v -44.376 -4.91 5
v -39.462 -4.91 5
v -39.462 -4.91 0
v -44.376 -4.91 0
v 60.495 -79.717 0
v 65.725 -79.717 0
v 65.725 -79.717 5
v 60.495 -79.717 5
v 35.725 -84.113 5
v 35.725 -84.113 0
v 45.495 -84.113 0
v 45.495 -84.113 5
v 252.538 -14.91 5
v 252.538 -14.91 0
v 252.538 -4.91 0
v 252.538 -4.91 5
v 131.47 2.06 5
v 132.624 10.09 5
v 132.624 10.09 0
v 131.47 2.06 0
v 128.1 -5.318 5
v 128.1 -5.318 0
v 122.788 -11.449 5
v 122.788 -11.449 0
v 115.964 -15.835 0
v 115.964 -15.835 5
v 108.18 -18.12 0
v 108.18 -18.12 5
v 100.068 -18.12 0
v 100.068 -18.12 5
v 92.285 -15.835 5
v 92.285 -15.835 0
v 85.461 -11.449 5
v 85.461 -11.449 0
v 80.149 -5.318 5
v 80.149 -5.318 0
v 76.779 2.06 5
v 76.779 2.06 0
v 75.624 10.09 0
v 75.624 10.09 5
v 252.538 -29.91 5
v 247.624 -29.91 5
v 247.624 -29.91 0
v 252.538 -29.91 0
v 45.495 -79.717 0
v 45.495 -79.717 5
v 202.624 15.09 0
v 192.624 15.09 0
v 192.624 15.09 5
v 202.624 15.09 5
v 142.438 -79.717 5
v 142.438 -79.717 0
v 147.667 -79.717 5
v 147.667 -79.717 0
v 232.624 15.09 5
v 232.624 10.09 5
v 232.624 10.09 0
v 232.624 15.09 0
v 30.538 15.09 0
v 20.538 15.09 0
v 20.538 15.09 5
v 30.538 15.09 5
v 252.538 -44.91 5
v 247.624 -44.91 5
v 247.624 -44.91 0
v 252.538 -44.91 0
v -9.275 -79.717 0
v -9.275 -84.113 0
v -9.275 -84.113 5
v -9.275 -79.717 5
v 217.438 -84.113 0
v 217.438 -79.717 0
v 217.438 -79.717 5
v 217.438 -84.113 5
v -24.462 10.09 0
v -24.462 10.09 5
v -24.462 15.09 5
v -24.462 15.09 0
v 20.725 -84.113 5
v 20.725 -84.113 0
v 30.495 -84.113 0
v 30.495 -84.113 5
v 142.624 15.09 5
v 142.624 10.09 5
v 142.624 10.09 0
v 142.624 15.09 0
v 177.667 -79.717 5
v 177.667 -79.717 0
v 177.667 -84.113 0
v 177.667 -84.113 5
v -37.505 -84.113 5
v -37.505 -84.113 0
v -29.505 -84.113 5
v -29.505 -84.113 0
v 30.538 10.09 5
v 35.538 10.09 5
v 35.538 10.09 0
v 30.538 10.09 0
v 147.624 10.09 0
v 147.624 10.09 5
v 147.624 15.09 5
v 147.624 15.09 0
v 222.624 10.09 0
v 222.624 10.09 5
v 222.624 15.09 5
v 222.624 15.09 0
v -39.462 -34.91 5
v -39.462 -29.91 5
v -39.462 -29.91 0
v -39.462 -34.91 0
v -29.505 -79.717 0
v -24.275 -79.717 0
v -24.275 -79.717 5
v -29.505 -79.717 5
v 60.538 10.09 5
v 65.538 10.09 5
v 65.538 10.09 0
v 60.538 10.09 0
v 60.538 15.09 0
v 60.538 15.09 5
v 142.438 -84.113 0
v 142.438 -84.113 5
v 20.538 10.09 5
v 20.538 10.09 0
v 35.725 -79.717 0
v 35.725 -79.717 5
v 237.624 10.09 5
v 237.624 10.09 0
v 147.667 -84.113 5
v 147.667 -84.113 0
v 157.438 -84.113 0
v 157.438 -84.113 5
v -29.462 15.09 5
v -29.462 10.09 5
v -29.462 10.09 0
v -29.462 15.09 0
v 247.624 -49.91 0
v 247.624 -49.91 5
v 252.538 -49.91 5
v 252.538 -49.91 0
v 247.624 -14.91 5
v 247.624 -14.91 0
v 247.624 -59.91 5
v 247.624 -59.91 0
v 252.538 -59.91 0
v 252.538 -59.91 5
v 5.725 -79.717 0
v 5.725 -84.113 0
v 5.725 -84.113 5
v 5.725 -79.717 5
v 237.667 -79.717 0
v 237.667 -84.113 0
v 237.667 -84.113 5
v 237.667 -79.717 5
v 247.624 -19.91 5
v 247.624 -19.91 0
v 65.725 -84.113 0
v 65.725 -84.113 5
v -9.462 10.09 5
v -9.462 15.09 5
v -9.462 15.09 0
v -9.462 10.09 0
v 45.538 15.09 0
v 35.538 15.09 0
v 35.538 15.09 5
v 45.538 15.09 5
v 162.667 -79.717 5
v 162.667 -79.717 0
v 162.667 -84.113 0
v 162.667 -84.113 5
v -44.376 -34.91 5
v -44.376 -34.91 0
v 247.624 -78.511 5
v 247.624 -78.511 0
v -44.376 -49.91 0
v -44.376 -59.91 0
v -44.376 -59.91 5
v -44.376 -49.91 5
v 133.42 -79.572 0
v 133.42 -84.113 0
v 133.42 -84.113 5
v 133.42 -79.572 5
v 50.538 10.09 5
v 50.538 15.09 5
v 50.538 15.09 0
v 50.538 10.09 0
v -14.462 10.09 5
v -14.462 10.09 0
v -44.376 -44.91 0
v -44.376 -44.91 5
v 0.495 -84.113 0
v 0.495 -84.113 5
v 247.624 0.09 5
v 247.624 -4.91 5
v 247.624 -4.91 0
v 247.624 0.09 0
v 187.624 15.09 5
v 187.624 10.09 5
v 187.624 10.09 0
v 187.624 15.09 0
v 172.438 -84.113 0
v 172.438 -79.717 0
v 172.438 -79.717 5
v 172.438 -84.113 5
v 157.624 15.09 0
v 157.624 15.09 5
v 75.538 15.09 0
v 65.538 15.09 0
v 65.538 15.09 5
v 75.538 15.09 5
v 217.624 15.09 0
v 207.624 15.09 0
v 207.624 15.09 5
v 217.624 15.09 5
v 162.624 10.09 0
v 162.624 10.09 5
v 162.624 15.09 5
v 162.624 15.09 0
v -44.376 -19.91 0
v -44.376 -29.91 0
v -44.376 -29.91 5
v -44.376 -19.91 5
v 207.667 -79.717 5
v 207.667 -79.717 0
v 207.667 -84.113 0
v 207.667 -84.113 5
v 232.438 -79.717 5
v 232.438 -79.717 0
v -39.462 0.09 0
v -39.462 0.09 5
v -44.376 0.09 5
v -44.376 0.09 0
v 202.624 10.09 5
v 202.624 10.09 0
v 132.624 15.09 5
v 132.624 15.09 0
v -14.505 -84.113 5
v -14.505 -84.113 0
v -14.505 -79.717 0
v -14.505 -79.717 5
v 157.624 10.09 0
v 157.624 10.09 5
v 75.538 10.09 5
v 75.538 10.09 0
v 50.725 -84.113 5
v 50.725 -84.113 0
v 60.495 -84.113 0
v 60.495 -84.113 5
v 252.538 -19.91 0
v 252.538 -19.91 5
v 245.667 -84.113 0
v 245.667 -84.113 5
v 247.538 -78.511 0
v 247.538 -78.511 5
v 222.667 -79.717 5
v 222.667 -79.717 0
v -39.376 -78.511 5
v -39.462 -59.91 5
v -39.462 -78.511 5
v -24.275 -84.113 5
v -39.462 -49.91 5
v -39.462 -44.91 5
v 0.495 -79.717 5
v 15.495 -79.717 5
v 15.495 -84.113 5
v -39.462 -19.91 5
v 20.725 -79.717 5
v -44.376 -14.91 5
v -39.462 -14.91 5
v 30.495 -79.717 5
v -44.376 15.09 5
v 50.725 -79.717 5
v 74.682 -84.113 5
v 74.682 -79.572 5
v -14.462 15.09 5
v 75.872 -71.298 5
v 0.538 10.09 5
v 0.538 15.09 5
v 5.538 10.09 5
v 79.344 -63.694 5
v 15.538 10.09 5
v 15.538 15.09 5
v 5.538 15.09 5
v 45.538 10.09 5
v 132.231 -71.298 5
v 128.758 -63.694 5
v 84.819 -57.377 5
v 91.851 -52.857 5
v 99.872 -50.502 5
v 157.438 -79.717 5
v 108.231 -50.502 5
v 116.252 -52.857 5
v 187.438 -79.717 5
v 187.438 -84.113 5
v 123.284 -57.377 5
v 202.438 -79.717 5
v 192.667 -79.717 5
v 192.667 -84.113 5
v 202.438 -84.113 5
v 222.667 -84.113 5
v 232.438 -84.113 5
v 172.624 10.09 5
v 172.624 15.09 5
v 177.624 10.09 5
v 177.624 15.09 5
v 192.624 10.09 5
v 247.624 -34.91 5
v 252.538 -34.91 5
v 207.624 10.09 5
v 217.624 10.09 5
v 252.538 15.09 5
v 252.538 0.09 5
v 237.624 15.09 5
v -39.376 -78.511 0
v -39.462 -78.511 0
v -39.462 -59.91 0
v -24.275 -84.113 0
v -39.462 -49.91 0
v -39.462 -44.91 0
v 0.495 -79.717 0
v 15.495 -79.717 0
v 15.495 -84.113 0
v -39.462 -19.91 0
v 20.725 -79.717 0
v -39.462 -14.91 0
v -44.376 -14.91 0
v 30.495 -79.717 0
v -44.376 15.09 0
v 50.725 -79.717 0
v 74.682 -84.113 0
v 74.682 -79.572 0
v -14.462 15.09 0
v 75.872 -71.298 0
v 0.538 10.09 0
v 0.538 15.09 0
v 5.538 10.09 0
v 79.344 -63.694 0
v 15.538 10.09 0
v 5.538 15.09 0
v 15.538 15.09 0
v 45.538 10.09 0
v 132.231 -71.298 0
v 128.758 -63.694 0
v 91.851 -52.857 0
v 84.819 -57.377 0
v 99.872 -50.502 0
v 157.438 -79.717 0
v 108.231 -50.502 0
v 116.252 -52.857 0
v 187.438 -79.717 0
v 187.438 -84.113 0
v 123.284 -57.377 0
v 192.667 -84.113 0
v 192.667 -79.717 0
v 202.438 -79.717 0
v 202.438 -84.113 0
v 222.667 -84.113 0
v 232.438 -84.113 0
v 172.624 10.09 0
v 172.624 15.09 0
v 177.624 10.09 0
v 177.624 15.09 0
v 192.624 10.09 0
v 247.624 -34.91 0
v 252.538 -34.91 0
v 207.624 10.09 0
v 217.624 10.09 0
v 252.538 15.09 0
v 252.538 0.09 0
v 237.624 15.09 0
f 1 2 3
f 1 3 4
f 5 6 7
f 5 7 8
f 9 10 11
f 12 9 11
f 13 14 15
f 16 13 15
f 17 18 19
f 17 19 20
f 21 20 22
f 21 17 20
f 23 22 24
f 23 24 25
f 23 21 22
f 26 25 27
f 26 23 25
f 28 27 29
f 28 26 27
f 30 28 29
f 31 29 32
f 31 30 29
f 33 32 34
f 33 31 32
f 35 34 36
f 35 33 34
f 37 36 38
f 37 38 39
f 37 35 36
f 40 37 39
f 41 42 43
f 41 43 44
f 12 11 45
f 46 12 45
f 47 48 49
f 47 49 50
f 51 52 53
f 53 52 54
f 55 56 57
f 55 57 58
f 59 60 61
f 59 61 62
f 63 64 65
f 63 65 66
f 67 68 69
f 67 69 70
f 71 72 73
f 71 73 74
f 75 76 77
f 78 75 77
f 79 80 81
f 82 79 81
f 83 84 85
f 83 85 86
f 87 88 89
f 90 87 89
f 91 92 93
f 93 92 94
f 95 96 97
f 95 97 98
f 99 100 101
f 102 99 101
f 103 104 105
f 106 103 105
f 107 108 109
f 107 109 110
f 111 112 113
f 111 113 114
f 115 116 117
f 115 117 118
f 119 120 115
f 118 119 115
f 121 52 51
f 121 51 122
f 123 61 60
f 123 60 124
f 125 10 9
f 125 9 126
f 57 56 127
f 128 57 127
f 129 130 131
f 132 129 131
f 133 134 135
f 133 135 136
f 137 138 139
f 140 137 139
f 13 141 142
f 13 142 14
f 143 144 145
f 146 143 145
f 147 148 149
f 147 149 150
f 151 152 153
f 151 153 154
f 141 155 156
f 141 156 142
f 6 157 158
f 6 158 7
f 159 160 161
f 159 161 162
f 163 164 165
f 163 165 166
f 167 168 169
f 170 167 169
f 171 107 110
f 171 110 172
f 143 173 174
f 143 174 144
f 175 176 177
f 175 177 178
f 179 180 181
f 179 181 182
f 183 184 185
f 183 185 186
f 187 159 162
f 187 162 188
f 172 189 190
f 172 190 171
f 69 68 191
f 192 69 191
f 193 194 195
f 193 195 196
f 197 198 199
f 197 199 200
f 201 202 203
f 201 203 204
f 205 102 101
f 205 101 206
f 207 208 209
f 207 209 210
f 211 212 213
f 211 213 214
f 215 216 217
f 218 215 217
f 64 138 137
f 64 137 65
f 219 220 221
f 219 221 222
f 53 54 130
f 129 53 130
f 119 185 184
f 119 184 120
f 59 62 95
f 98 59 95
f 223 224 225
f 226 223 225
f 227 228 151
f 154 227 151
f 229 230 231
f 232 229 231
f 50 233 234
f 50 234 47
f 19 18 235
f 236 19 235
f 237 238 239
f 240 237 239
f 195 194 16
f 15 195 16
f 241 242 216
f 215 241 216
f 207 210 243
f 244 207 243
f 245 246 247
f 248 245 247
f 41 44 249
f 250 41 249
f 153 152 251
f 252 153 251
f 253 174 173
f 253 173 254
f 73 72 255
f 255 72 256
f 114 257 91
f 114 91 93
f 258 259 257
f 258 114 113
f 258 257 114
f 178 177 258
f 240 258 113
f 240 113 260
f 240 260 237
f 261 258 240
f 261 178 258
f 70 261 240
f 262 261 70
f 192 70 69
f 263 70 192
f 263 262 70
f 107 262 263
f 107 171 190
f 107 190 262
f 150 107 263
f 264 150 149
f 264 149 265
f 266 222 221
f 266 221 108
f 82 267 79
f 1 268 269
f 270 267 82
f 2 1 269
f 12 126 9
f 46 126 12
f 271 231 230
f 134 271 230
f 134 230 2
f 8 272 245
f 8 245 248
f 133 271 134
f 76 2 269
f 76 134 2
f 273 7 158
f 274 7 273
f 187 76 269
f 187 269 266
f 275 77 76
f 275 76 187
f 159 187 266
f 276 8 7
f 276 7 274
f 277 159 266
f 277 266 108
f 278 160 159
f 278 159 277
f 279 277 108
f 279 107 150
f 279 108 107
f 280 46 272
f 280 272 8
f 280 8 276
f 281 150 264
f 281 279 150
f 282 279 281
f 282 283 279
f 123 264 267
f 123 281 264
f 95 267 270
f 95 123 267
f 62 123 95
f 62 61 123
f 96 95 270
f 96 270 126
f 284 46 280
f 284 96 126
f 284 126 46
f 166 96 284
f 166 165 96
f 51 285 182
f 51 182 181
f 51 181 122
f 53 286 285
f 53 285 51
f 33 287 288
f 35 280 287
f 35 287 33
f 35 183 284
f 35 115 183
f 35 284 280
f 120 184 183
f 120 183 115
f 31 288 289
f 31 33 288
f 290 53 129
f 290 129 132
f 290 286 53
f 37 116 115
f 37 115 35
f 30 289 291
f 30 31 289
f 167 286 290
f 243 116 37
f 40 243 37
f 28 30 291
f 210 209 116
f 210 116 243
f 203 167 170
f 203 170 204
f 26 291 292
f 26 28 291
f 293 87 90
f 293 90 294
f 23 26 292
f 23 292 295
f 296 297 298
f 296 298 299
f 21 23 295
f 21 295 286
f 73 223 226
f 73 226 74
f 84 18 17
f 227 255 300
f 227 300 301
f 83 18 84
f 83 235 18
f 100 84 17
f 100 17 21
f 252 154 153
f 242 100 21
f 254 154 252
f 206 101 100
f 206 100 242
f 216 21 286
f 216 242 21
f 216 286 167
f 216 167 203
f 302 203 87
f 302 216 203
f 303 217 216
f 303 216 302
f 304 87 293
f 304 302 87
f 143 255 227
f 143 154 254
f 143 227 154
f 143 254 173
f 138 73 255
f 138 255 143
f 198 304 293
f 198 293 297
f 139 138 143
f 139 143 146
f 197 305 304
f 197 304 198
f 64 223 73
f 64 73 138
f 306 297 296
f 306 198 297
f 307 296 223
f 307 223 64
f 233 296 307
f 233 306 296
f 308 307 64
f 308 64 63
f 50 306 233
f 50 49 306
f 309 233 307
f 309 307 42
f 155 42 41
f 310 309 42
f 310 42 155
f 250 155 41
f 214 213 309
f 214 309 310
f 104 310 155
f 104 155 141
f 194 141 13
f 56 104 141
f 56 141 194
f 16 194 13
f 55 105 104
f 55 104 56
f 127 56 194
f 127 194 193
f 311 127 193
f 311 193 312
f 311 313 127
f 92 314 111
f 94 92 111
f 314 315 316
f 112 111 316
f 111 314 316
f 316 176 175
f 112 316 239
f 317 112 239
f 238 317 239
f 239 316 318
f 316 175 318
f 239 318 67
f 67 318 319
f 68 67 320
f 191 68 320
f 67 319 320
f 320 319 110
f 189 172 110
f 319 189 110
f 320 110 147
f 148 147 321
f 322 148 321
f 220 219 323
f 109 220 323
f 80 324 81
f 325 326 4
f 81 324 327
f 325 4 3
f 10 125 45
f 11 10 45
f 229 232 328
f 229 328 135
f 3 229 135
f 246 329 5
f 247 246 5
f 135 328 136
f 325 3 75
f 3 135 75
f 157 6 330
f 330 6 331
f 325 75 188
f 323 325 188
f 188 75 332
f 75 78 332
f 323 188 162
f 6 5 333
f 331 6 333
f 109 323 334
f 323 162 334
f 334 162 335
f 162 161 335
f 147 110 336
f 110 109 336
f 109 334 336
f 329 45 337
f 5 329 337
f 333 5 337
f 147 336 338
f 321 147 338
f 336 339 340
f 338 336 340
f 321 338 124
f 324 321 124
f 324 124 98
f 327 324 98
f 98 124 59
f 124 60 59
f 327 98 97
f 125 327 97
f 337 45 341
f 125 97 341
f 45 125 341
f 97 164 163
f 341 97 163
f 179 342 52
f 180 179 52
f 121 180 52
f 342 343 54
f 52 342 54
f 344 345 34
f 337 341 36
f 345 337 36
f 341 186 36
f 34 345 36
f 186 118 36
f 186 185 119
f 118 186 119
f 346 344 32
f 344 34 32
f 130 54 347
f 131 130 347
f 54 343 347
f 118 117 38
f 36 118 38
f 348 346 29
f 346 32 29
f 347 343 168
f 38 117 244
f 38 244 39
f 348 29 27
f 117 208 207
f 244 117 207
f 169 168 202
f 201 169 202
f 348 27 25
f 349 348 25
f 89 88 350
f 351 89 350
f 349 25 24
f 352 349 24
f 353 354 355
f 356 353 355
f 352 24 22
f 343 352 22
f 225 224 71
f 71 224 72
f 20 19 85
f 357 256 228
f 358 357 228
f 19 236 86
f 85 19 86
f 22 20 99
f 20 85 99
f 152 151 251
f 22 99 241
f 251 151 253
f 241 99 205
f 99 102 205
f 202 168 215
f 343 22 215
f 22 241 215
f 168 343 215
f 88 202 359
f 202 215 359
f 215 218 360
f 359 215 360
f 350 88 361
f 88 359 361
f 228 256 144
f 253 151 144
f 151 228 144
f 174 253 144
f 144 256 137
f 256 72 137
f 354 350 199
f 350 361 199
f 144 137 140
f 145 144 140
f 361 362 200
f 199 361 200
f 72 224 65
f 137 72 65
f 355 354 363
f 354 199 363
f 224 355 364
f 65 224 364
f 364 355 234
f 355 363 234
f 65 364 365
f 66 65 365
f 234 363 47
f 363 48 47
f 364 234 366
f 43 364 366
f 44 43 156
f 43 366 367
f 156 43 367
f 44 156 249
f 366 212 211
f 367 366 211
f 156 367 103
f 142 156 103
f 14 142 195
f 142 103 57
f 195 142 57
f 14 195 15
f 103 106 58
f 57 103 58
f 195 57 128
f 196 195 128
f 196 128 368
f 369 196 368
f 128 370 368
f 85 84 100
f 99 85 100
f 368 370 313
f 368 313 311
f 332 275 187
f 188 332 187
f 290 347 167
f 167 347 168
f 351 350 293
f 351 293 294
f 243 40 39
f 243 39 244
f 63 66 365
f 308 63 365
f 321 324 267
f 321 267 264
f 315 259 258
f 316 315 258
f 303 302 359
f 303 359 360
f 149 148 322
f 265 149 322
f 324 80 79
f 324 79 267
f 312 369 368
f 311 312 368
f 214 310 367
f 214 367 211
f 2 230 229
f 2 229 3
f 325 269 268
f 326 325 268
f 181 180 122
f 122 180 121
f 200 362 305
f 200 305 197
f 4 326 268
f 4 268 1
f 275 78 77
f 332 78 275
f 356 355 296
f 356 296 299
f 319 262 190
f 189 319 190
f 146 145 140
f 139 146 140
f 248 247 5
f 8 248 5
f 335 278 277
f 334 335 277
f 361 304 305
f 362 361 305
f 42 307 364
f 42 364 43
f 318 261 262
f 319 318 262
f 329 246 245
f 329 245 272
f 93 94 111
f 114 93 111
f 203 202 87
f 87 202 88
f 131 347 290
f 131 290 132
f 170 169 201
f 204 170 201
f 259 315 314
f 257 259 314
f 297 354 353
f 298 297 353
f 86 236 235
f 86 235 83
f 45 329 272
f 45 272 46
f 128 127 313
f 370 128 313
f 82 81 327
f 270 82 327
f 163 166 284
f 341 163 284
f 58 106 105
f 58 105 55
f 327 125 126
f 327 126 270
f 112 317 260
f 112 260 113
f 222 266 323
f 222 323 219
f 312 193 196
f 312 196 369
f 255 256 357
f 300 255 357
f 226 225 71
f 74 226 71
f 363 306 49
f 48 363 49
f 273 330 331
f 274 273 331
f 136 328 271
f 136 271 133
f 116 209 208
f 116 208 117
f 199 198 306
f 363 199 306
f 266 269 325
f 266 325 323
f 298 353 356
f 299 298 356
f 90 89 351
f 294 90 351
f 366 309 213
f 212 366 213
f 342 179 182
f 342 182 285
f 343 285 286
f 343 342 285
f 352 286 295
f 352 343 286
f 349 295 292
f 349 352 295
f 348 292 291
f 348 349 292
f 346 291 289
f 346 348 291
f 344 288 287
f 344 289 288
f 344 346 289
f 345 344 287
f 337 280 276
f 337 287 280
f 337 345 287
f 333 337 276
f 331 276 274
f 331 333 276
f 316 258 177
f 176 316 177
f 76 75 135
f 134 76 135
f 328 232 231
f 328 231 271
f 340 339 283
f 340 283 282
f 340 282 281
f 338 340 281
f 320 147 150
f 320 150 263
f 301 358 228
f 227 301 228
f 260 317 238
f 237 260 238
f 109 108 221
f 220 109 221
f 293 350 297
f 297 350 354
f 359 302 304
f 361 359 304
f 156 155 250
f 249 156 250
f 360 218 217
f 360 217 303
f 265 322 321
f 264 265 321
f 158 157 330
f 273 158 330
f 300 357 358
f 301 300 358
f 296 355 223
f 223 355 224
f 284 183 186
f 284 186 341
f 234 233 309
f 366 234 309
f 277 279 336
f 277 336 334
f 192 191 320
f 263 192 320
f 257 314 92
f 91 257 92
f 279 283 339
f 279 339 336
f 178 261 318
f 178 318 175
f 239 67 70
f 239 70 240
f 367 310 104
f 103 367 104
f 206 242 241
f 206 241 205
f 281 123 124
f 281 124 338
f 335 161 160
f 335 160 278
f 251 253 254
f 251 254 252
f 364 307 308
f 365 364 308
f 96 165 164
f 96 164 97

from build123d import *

# Parameters (mm, degrees)
ESQUISSE1_W                = 296.913296363
ESQUISSE1_H                = 99.202689883
BOSS_EXTRU_1_DEPTH         = 5
ENL_V_MAT_EXTRU_1_DEPTH    = 10
ESQUISSE3_W                = 5.229303798
ESQUISSE3_H                = 4.396229451
ENL_V_MAT_EXTRU_2_DEPTH    = 10
R_P_TITION_LIN_AIRE1_COUNT = 7
R_P_TITION_LIN_AIRE1_PITCH = 15
SYM_TRIE1_COPY_1_SKETCH_W  = 5.229303798
SYM_TRIE1_COPY_1_SKETCH_H  = 4.396229451
SYM_TRIE1_COPY_1_DEPTH     = 10
SYM_TRIE1_COPY_2_SKETCH_W  = 5.229303798
SYM_TRIE1_COPY_2_SKETCH_H  = 4.396229451
SYM_TRIE1_COPY_2_DEPTH     = 10
SYM_TRIE1_COPY_3_SKETCH_W  = 5.229303798
SYM_TRIE1_COPY_3_SKETCH_H  = 4.396229451
SYM_TRIE1_COPY_3_DEPTH     = 10
SYM_TRIE1_COPY_4_SKETCH_W  = 5.229303798
SYM_TRIE1_COPY_4_SKETCH_H  = 4.396229451
SYM_TRIE1_COPY_4_DEPTH     = 10
SYM_TRIE1_COPY_5_SKETCH_W  = 5.229303798
SYM_TRIE1_COPY_5_SKETCH_H  = 4.396229451
SYM_TRIE1_COPY_5_DEPTH     = 10
SYM_TRIE1_COPY_6_SKETCH_W  = 5.229303798
SYM_TRIE1_COPY_6_SKETCH_H  = 4.396229451
SYM_TRIE1_COPY_6_DEPTH     = 10
ESQUISSE4_W                = 58.738288448
ESQUISSE4_H                = 4.540442772
ENL_V_MAT_EXTRU_3_DEPTH    = 10
ENL_V_MAT_EXTRU_4_DEPTH    = 10
ESQUISSE6_W                = 5
ESQUISSE6_H                = 5
ENL_V_MAT_EXTRU_5_DEPTH    = 5
R_P_TITION_LIN_AIRE2_COUNT = 8
R_P_TITION_LIN_AIRE2_PITCH = 15
ESQUISSE7_W                = 57
ESQUISSE7_H                = 5
ENL_V_MAT_EXTRU_6_DEPTH    = 5
ENL_V_MAT_EXTRU_7_DEPTH    = 5
SYM_TRIE2_COPY_1_SKETCH_W  = 5
SYM_TRIE2_COPY_1_SKETCH_H  = 5
SYM_TRIE2_COPY_1_DEPTH     = 5
SYM_TRIE2_COPY_2_SKETCH_W  = 5
SYM_TRIE2_COPY_2_SKETCH_H  = 5
SYM_TRIE2_COPY_2_DEPTH     = 5
SYM_TRIE2_COPY_3_SKETCH_W  = 5
SYM_TRIE2_COPY_3_SKETCH_H  = 5
SYM_TRIE2_COPY_3_DEPTH     = 5
SYM_TRIE2_COPY_4_SKETCH_W  = 5
SYM_TRIE2_COPY_4_SKETCH_H  = 5
SYM_TRIE2_COPY_4_DEPTH     = 5
SYM_TRIE2_COPY_5_SKETCH_W  = 5
SYM_TRIE2_COPY_5_SKETCH_H  = 5
SYM_TRIE2_COPY_5_DEPTH     = 5
SYM_TRIE2_COPY_6_SKETCH_W  = 5
SYM_TRIE2_COPY_6_SKETCH_H  = 5
SYM_TRIE2_COPY_6_DEPTH     = 5
SYM_TRIE2_COPY_7_SKETCH_W  = 5
SYM_TRIE2_COPY_7_SKETCH_H  = 5
SYM_TRIE2_COPY_7_DEPTH     = 5
ESQUISSE9_W                = 4.913296363
ESQUISSE9_H                = 18.600386247
ENL_V_MAT_EXTRU_8_DEPTH    = 5
ESQUISSE10_W               = 5
ESQUISSE10_H               = 5
ENL_V_MAT_EXTRU_9_DEPTH    = 5
R_P_TITION_LIN_AIRE3_COUNT = 4
R_P_TITION_LIN_AIRE3_PITCH = 15
SYM_TRIE3_COPY_1_SKETCH_W  = 5
SYM_TRIE3_COPY_1_SKETCH_H  = 5
SYM_TRIE3_COPY_1_DEPTH     = 5
SYM_TRIE3_COPY_2_SKETCH_W  = 5
SYM_TRIE3_COPY_2_SKETCH_H  = 5
SYM_TRIE3_COPY_2_DEPTH     = 5
SYM_TRIE3_COPY_3_SKETCH_W  = 5
SYM_TRIE3_COPY_3_SKETCH_H  = 5
SYM_TRIE3_COPY_3_DEPTH     = 5


with BuildPart() as part:
    # Esquisse1 → Boss.-Extru.1 (new body)
    with BuildSketch(Plane.XY):
        with Locations((104.081072913, -34.511559996)):
            Rectangle(ESQUISSE1_W, ESQUISSE1_H)
    extrude(amount=BOSS_EXTRU_1_DEPTH)

    # Esquisse2 → Enlèv. mat.-Extru.1 (cut)
    with BuildSketch(Plane(origin=(0, 0, 0), x_dir=(-1, 0, 0), z_dir=(0, 0, -1))):
        Polygon((44.375575269, -78.510601301), (39.375575269, -78.510601301), (37.504666451, -84.112904937), (44.375575269, -84.112904937), align=None)
    enl_v_mat_extru_1 = extrude(amount=-ENL_V_MAT_EXTRU_1_DEPTH, mode=Mode.SUBTRACT)

    # Esquisse3 → Enlèv. mat.-Extru.2 (cut)
    with BuildSketch(Plane(origin=(0, 0, 0), x_dir=(-1, 0, 0), z_dir=(0, 0, -1))):
        with Locations((26.890031572, -81.914790212)):
            Rectangle(ESQUISSE3_W, ESQUISSE3_H)
    enl_v_mat_extru_2 = extrude(amount=-ENL_V_MAT_EXTRU_2_DEPTH, mode=Mode.SUBTRACT)

    # Répétition linéaire1: Enlèv. mat.-Extru.2 ×7
    with Locations(*[(i * R_P_TITION_LIN_AIRE1_PITCH, 0, 0) for i in range(1, R_P_TITION_LIN_AIRE1_COUNT)]):
        add(enl_v_mat_extru_2, mode=Mode.SUBTRACT)

    # Symétrie1: Enlèv. mat.-Extru.1, Enlèv. mat.-Extru.2 across plane
    add(enl_v_mat_extru_1.mirror(Plane.ZY.offset(-104.081072913)), mode=Mode.SUBTRACT)
    add(enl_v_mat_extru_2.mirror(Plane.ZY.offset(-104.081072913)), mode=Mode.SUBTRACT)

    # Symétrie1 copy 1 sketch → Symétrie1 copy 1 (cut)
    with BuildSketch(Plane(origin=(193.162145825, 0, 0), x_dir=(1, 0, 0), z_dir=(0, 0, -1))):
        with Locations((26.890031572, 81.914790212)):
            Rectangle(SYM_TRIE1_COPY_1_SKETCH_W, SYM_TRIE1_COPY_1_SKETCH_H)
    extrude(amount=-SYM_TRIE1_COPY_1_DEPTH, mode=Mode.SUBTRACT)

    # Symétrie1 copy 2 sketch → Symétrie1 copy 2 (cut)
    with BuildSketch(Plane(origin=(178.162145825, 0, 0), x_dir=(1, 0, 0), z_dir=(0, 0, -1))):
        with Locations((26.890031572, 81.914790212)):
            Rectangle(SYM_TRIE1_COPY_2_SKETCH_W, SYM_TRIE1_COPY_2_SKETCH_H)
    extrude(amount=-SYM_TRIE1_COPY_2_DEPTH, mode=Mode.SUBTRACT)

    # Symétrie1 copy 3 sketch → Symétrie1 copy 3 (cut)
    with BuildSketch(Plane(origin=(163.162145825, 0, 0), x_dir=(1, 0, 0), z_dir=(0, 0, -1))):
        with Locations((26.890031572, 81.914790212)):
            Rectangle(SYM_TRIE1_COPY_3_SKETCH_W, SYM_TRIE1_COPY_3_SKETCH_H)
    extrude(amount=-SYM_TRIE1_COPY_3_DEPTH, mode=Mode.SUBTRACT)

    # Symétrie1 copy 4 sketch → Symétrie1 copy 4 (cut)
    with BuildSketch(Plane(origin=(148.162145825, 0, 0), x_dir=(1, 0, 0), z_dir=(0, 0, -1))):
        with Locations((26.890031572, 81.914790212)):
            Rectangle(SYM_TRIE1_COPY_4_SKETCH_W, SYM_TRIE1_COPY_4_SKETCH_H)
    extrude(amount=-SYM_TRIE1_COPY_4_DEPTH, mode=Mode.SUBTRACT)

    # Symétrie1 copy 5 sketch → Symétrie1 copy 5 (cut)
    with BuildSketch(Plane(origin=(133.162145825, 0, 0), x_dir=(1, 0, 0), z_dir=(0, 0, -1))):
        with Locations((26.890031572, 81.914790212)):
            Rectangle(SYM_TRIE1_COPY_5_SKETCH_W, SYM_TRIE1_COPY_5_SKETCH_H)
    extrude(amount=-SYM_TRIE1_COPY_5_DEPTH, mode=Mode.SUBTRACT)

    # Symétrie1 copy 6 sketch → Symétrie1 copy 6 (cut)
    with BuildSketch(Plane(origin=(118.162145825, 0, 0), x_dir=(1, 0, 0), z_dir=(0, 0, -1))):
        with Locations((26.890031572, 81.914790212)):
            Rectangle(SYM_TRIE1_COPY_6_SKETCH_W, SYM_TRIE1_COPY_6_SKETCH_H)
    extrude(amount=-SYM_TRIE1_COPY_6_DEPTH, mode=Mode.SUBTRACT)

    # Esquisse4 → Enlèv. mat.-Extru.3 (cut)
    with BuildSketch(Plane(origin=(0, 0, 0), x_dir=(-1, 0, 0), z_dir=(0, 0, -1))):
        with Locations((-104.051236875, -81.842683551)):
            Rectangle(ESQUISSE4_W, ESQUISSE4_H)
    extrude(amount=-ENL_V_MAT_EXTRU_3_DEPTH, mode=Mode.SUBTRACT)

    # Esquisse5 → Enlèv. mat.-Extru.4 (cut)
    with BuildSketch(Plane(origin=(0, 0, 0), x_dir=(-1, 0, 0), z_dir=(0, 0, -1))):
        with BuildLine():
            Line((-74.682092651, -79.572462165), (-133.420381099, -79.572462165))
            ThreePointArc((-133.420381099, -79.572462165), (-104.051236875, -50.20331794), (-74.682092651, -79.572462165))
        make_face()
    extrude(amount=-ENL_V_MAT_EXTRU_4_DEPTH, mode=Mode.SUBTRACT)

    # Esquisse6 → Enlèv. mat.-Extru.5 (cut)
    with BuildSketch(Plane.XY.offset(5)):
        with Locations((235.124424731, 12.589784946)):
            Rectangle(ESQUISSE6_W, ESQUISSE6_H)
    enl_v_mat_extru_5 = extrude(amount=-ENL_V_MAT_EXTRU_5_DEPTH, mode=Mode.SUBTRACT)

    # Répétition linéaire2: Enlèv. mat.-Extru.5 ×8
    with Locations(*[(-i * R_P_TITION_LIN_AIRE2_PITCH, 0, 0) for i in range(1, R_P_TITION_LIN_AIRE2_COUNT)]):
        add(enl_v_mat_extru_5, mode=Mode.SUBTRACT)

    # Esquisse7 → Enlèv. mat.-Extru.6 (cut)
    with BuildSketch(Plane.XY.offset(5)):
        with Locations((104.124424731, 12.589784946)):
            Rectangle(ESQUISSE7_W, ESQUISSE7_H)
    extrude(amount=-ENL_V_MAT_EXTRU_6_DEPTH, mode=Mode.SUBTRACT)

    # Esquisse8 → Enlèv. mat.-Extru.7 (cut)
    with BuildSketch(Plane.XY.offset(5)):
        with BuildLine():
            ThreePointArc((132.624424731, 10.089784946), (104.124424731, -18.410215054), (75.624424731, 10.089784946))
            Line((75.624424731, 10.089784946), (132.624424731, 10.089784946))
        make_face()
    extrude(amount=-ENL_V_MAT_EXTRU_7_DEPTH, mode=Mode.SUBTRACT)

    # Symétrie2: Enlèv. mat.-Extru.5 across plane
    add(enl_v_mat_extru_5.mirror(Plane(origin=(104.081072913, 0, 0), x_dir=(0, 0, 1), z_dir=(1, 0, 0))), mode=Mode.SUBTRACT)

    # Symétrie2 copy 1 sketch → Symétrie2 copy 1 (cut)
    with BuildSketch(Plane(origin=(223.162145825, 0, 5), x_dir=(-1, 0, 0), z_dir=(0, 0, 1))):
        with Locations((235.124424731, -12.589784946)):
            Rectangle(SYM_TRIE2_COPY_1_SKETCH_W, SYM_TRIE2_COPY_1_SKETCH_H)
    extrude(amount=-SYM_TRIE2_COPY_1_DEPTH, mode=Mode.SUBTRACT)

    # Symétrie2 copy 2 sketch → Symétrie2 copy 2 (cut)
    with BuildSketch(Plane(origin=(238.162145825, 0, 5), x_dir=(-1, 0, 0), z_dir=(0, 0, 1))):
        with Locations((235.124424731, -12.589784946)):
            Rectangle(SYM_TRIE2_COPY_2_SKETCH_W, SYM_TRIE2_COPY_2_SKETCH_H)
    extrude(amount=-SYM_TRIE2_COPY_2_DEPTH, mode=Mode.SUBTRACT)

    # Symétrie2 copy 3 sketch → Symétrie2 copy 3 (cut)
    with BuildSketch(Plane(origin=(253.162145825, 0, 5), x_dir=(-1, 0, 0), z_dir=(0, 0, 1))):
        with Locations((235.124424731, -12.589784946)):
            Rectangle(SYM_TRIE2_COPY_3_SKETCH_W, SYM_TRIE2_COPY_3_SKETCH_H)
    extrude(amount=-SYM_TRIE2_COPY_3_DEPTH, mode=Mode.SUBTRACT)

    # Symétrie2 copy 4 sketch → Symétrie2 copy 4 (cut)
    with BuildSketch(Plane(origin=(268.162145825, 0, 5), x_dir=(-1, 0, 0), z_dir=(0, 0, 1))):
        with Locations((235.124424731, -12.589784946)):
            Rectangle(SYM_TRIE2_COPY_4_SKETCH_W, SYM_TRIE2_COPY_4_SKETCH_H)
    extrude(amount=-SYM_TRIE2_COPY_4_DEPTH, mode=Mode.SUBTRACT)

    # Symétrie2 copy 5 sketch → Symétrie2 copy 5 (cut)
    with BuildSketch(Plane(origin=(283.162145825, 0, 5), x_dir=(-1, 0, 0), z_dir=(0, 0, 1))):
        with Locations((235.124424731, -12.589784946)):
            Rectangle(SYM_TRIE2_COPY_5_SKETCH_W, SYM_TRIE2_COPY_5_SKETCH_H)
    extrude(amount=-SYM_TRIE2_COPY_5_DEPTH, mode=Mode.SUBTRACT)

    # Symétrie2 copy 6 sketch → Symétrie2 copy 6 (cut)
    with BuildSketch(Plane(origin=(298.162145825, 0, 5), x_dir=(-1, 0, 0), z_dir=(0, 0, 1))):
        with Locations((235.124424731, -12.589784946)):
            Rectangle(SYM_TRIE2_COPY_6_SKETCH_W, SYM_TRIE2_COPY_6_SKETCH_H)
    extrude(amount=-SYM_TRIE2_COPY_6_DEPTH, mode=Mode.SUBTRACT)

    # Symétrie2 copy 7 sketch → Symétrie2 copy 7 (cut)
    with BuildSketch(Plane(origin=(313.162145825, 0, 5), x_dir=(-1, 0, 0), z_dir=(0, 0, 1))):
        with Locations((235.124424731, -12.589784946)):
            Rectangle(SYM_TRIE2_COPY_7_SKETCH_W, SYM_TRIE2_COPY_7_SKETCH_H)
    extrude(amount=-SYM_TRIE2_COPY_7_DEPTH, mode=Mode.SUBTRACT)

    # Esquisse9 → Enlèv. mat.-Extru.8 (cut)
    with BuildSketch(Plane.XY.offset(5)):
        with Locations((250.081072913, -69.210408177)):
            Rectangle(ESQUISSE9_W, ESQUISSE9_H)
    enl_v_mat_extru_8 = extrude(amount=-ENL_V_MAT_EXTRU_8_DEPTH, mode=Mode.SUBTRACT)

    # Esquisse10 → Enlèv. mat.-Extru.9 (cut)
    with BuildSketch(Plane.XY.offset(5)):
        with Locations((250.124424731, -47.410215054)):
            Rectangle(ESQUISSE10_W, ESQUISSE10_H)
    enl_v_mat_extru_9 = extrude(amount=-ENL_V_MAT_EXTRU_9_DEPTH, mode=Mode.SUBTRACT)

    # Répétition linéaire3: Enlèv. mat.-Extru.9 ×4
    with Locations(*[(0, i * R_P_TITION_LIN_AIRE3_PITCH, 0) for i in range(1, R_P_TITION_LIN_AIRE3_COUNT)]):
        add(enl_v_mat_extru_9, mode=Mode.SUBTRACT)

    # Symétrie3: Enlèv. mat.-Extru.8, Enlèv. mat.-Extru.9 across plane
    add(enl_v_mat_extru_8.mirror(Plane(origin=(104.081072913, 0, 0), x_dir=(0, 0, 1), z_dir=(1, 0, 0))), mode=Mode.SUBTRACT)
    add(enl_v_mat_extru_9.mirror(Plane(origin=(104.081072913, 0, 0), x_dir=(0, 0, 1), z_dir=(1, 0, 0))), mode=Mode.SUBTRACT)

    # Symétrie3 copy 1 sketch → Symétrie3 copy 1 (cut)
    with BuildSketch(Plane(origin=(208.162145825, 15, 5), x_dir=(-1, 0, 0), z_dir=(0, 0, 1))):
        with Locations((250.124424731, 47.410215054)):
            Rectangle(SYM_TRIE3_COPY_1_SKETCH_W, SYM_TRIE3_COPY_1_SKETCH_H)
    extrude(amount=-SYM_TRIE3_COPY_1_DEPTH, mode=Mode.SUBTRACT)

    # Symétrie3 copy 2 sketch → Symétrie3 copy 2 (cut)
    with BuildSketch(Plane(origin=(208.162145825, 30, 5), x_dir=(-1, 0, 0), z_dir=(0, 0, 1))):
        with Locations((250.124424731, 47.410215054)):
            Rectangle(SYM_TRIE3_COPY_2_SKETCH_W, SYM_TRIE3_COPY_2_SKETCH_H)
    extrude(amount=-SYM_TRIE3_COPY_2_DEPTH, mode=Mode.SUBTRACT)

    # Symétrie3 copy 3 sketch → Symétrie3 copy 3 (cut)
    with BuildSketch(Plane(origin=(208.162145825, 45, 5), x_dir=(-1, 0, 0), z_dir=(0, 0, 1))):
        with Locations((250.124424731, 47.410215054)):
            Rectangle(SYM_TRIE3_COPY_3_SKETCH_W, SYM_TRIE3_COPY_3_SKETCH_H)
    extrude(amount=-SYM_TRIE3_COPY_3_DEPTH, mode=Mode.SUBTRACT)


solid = part.part
